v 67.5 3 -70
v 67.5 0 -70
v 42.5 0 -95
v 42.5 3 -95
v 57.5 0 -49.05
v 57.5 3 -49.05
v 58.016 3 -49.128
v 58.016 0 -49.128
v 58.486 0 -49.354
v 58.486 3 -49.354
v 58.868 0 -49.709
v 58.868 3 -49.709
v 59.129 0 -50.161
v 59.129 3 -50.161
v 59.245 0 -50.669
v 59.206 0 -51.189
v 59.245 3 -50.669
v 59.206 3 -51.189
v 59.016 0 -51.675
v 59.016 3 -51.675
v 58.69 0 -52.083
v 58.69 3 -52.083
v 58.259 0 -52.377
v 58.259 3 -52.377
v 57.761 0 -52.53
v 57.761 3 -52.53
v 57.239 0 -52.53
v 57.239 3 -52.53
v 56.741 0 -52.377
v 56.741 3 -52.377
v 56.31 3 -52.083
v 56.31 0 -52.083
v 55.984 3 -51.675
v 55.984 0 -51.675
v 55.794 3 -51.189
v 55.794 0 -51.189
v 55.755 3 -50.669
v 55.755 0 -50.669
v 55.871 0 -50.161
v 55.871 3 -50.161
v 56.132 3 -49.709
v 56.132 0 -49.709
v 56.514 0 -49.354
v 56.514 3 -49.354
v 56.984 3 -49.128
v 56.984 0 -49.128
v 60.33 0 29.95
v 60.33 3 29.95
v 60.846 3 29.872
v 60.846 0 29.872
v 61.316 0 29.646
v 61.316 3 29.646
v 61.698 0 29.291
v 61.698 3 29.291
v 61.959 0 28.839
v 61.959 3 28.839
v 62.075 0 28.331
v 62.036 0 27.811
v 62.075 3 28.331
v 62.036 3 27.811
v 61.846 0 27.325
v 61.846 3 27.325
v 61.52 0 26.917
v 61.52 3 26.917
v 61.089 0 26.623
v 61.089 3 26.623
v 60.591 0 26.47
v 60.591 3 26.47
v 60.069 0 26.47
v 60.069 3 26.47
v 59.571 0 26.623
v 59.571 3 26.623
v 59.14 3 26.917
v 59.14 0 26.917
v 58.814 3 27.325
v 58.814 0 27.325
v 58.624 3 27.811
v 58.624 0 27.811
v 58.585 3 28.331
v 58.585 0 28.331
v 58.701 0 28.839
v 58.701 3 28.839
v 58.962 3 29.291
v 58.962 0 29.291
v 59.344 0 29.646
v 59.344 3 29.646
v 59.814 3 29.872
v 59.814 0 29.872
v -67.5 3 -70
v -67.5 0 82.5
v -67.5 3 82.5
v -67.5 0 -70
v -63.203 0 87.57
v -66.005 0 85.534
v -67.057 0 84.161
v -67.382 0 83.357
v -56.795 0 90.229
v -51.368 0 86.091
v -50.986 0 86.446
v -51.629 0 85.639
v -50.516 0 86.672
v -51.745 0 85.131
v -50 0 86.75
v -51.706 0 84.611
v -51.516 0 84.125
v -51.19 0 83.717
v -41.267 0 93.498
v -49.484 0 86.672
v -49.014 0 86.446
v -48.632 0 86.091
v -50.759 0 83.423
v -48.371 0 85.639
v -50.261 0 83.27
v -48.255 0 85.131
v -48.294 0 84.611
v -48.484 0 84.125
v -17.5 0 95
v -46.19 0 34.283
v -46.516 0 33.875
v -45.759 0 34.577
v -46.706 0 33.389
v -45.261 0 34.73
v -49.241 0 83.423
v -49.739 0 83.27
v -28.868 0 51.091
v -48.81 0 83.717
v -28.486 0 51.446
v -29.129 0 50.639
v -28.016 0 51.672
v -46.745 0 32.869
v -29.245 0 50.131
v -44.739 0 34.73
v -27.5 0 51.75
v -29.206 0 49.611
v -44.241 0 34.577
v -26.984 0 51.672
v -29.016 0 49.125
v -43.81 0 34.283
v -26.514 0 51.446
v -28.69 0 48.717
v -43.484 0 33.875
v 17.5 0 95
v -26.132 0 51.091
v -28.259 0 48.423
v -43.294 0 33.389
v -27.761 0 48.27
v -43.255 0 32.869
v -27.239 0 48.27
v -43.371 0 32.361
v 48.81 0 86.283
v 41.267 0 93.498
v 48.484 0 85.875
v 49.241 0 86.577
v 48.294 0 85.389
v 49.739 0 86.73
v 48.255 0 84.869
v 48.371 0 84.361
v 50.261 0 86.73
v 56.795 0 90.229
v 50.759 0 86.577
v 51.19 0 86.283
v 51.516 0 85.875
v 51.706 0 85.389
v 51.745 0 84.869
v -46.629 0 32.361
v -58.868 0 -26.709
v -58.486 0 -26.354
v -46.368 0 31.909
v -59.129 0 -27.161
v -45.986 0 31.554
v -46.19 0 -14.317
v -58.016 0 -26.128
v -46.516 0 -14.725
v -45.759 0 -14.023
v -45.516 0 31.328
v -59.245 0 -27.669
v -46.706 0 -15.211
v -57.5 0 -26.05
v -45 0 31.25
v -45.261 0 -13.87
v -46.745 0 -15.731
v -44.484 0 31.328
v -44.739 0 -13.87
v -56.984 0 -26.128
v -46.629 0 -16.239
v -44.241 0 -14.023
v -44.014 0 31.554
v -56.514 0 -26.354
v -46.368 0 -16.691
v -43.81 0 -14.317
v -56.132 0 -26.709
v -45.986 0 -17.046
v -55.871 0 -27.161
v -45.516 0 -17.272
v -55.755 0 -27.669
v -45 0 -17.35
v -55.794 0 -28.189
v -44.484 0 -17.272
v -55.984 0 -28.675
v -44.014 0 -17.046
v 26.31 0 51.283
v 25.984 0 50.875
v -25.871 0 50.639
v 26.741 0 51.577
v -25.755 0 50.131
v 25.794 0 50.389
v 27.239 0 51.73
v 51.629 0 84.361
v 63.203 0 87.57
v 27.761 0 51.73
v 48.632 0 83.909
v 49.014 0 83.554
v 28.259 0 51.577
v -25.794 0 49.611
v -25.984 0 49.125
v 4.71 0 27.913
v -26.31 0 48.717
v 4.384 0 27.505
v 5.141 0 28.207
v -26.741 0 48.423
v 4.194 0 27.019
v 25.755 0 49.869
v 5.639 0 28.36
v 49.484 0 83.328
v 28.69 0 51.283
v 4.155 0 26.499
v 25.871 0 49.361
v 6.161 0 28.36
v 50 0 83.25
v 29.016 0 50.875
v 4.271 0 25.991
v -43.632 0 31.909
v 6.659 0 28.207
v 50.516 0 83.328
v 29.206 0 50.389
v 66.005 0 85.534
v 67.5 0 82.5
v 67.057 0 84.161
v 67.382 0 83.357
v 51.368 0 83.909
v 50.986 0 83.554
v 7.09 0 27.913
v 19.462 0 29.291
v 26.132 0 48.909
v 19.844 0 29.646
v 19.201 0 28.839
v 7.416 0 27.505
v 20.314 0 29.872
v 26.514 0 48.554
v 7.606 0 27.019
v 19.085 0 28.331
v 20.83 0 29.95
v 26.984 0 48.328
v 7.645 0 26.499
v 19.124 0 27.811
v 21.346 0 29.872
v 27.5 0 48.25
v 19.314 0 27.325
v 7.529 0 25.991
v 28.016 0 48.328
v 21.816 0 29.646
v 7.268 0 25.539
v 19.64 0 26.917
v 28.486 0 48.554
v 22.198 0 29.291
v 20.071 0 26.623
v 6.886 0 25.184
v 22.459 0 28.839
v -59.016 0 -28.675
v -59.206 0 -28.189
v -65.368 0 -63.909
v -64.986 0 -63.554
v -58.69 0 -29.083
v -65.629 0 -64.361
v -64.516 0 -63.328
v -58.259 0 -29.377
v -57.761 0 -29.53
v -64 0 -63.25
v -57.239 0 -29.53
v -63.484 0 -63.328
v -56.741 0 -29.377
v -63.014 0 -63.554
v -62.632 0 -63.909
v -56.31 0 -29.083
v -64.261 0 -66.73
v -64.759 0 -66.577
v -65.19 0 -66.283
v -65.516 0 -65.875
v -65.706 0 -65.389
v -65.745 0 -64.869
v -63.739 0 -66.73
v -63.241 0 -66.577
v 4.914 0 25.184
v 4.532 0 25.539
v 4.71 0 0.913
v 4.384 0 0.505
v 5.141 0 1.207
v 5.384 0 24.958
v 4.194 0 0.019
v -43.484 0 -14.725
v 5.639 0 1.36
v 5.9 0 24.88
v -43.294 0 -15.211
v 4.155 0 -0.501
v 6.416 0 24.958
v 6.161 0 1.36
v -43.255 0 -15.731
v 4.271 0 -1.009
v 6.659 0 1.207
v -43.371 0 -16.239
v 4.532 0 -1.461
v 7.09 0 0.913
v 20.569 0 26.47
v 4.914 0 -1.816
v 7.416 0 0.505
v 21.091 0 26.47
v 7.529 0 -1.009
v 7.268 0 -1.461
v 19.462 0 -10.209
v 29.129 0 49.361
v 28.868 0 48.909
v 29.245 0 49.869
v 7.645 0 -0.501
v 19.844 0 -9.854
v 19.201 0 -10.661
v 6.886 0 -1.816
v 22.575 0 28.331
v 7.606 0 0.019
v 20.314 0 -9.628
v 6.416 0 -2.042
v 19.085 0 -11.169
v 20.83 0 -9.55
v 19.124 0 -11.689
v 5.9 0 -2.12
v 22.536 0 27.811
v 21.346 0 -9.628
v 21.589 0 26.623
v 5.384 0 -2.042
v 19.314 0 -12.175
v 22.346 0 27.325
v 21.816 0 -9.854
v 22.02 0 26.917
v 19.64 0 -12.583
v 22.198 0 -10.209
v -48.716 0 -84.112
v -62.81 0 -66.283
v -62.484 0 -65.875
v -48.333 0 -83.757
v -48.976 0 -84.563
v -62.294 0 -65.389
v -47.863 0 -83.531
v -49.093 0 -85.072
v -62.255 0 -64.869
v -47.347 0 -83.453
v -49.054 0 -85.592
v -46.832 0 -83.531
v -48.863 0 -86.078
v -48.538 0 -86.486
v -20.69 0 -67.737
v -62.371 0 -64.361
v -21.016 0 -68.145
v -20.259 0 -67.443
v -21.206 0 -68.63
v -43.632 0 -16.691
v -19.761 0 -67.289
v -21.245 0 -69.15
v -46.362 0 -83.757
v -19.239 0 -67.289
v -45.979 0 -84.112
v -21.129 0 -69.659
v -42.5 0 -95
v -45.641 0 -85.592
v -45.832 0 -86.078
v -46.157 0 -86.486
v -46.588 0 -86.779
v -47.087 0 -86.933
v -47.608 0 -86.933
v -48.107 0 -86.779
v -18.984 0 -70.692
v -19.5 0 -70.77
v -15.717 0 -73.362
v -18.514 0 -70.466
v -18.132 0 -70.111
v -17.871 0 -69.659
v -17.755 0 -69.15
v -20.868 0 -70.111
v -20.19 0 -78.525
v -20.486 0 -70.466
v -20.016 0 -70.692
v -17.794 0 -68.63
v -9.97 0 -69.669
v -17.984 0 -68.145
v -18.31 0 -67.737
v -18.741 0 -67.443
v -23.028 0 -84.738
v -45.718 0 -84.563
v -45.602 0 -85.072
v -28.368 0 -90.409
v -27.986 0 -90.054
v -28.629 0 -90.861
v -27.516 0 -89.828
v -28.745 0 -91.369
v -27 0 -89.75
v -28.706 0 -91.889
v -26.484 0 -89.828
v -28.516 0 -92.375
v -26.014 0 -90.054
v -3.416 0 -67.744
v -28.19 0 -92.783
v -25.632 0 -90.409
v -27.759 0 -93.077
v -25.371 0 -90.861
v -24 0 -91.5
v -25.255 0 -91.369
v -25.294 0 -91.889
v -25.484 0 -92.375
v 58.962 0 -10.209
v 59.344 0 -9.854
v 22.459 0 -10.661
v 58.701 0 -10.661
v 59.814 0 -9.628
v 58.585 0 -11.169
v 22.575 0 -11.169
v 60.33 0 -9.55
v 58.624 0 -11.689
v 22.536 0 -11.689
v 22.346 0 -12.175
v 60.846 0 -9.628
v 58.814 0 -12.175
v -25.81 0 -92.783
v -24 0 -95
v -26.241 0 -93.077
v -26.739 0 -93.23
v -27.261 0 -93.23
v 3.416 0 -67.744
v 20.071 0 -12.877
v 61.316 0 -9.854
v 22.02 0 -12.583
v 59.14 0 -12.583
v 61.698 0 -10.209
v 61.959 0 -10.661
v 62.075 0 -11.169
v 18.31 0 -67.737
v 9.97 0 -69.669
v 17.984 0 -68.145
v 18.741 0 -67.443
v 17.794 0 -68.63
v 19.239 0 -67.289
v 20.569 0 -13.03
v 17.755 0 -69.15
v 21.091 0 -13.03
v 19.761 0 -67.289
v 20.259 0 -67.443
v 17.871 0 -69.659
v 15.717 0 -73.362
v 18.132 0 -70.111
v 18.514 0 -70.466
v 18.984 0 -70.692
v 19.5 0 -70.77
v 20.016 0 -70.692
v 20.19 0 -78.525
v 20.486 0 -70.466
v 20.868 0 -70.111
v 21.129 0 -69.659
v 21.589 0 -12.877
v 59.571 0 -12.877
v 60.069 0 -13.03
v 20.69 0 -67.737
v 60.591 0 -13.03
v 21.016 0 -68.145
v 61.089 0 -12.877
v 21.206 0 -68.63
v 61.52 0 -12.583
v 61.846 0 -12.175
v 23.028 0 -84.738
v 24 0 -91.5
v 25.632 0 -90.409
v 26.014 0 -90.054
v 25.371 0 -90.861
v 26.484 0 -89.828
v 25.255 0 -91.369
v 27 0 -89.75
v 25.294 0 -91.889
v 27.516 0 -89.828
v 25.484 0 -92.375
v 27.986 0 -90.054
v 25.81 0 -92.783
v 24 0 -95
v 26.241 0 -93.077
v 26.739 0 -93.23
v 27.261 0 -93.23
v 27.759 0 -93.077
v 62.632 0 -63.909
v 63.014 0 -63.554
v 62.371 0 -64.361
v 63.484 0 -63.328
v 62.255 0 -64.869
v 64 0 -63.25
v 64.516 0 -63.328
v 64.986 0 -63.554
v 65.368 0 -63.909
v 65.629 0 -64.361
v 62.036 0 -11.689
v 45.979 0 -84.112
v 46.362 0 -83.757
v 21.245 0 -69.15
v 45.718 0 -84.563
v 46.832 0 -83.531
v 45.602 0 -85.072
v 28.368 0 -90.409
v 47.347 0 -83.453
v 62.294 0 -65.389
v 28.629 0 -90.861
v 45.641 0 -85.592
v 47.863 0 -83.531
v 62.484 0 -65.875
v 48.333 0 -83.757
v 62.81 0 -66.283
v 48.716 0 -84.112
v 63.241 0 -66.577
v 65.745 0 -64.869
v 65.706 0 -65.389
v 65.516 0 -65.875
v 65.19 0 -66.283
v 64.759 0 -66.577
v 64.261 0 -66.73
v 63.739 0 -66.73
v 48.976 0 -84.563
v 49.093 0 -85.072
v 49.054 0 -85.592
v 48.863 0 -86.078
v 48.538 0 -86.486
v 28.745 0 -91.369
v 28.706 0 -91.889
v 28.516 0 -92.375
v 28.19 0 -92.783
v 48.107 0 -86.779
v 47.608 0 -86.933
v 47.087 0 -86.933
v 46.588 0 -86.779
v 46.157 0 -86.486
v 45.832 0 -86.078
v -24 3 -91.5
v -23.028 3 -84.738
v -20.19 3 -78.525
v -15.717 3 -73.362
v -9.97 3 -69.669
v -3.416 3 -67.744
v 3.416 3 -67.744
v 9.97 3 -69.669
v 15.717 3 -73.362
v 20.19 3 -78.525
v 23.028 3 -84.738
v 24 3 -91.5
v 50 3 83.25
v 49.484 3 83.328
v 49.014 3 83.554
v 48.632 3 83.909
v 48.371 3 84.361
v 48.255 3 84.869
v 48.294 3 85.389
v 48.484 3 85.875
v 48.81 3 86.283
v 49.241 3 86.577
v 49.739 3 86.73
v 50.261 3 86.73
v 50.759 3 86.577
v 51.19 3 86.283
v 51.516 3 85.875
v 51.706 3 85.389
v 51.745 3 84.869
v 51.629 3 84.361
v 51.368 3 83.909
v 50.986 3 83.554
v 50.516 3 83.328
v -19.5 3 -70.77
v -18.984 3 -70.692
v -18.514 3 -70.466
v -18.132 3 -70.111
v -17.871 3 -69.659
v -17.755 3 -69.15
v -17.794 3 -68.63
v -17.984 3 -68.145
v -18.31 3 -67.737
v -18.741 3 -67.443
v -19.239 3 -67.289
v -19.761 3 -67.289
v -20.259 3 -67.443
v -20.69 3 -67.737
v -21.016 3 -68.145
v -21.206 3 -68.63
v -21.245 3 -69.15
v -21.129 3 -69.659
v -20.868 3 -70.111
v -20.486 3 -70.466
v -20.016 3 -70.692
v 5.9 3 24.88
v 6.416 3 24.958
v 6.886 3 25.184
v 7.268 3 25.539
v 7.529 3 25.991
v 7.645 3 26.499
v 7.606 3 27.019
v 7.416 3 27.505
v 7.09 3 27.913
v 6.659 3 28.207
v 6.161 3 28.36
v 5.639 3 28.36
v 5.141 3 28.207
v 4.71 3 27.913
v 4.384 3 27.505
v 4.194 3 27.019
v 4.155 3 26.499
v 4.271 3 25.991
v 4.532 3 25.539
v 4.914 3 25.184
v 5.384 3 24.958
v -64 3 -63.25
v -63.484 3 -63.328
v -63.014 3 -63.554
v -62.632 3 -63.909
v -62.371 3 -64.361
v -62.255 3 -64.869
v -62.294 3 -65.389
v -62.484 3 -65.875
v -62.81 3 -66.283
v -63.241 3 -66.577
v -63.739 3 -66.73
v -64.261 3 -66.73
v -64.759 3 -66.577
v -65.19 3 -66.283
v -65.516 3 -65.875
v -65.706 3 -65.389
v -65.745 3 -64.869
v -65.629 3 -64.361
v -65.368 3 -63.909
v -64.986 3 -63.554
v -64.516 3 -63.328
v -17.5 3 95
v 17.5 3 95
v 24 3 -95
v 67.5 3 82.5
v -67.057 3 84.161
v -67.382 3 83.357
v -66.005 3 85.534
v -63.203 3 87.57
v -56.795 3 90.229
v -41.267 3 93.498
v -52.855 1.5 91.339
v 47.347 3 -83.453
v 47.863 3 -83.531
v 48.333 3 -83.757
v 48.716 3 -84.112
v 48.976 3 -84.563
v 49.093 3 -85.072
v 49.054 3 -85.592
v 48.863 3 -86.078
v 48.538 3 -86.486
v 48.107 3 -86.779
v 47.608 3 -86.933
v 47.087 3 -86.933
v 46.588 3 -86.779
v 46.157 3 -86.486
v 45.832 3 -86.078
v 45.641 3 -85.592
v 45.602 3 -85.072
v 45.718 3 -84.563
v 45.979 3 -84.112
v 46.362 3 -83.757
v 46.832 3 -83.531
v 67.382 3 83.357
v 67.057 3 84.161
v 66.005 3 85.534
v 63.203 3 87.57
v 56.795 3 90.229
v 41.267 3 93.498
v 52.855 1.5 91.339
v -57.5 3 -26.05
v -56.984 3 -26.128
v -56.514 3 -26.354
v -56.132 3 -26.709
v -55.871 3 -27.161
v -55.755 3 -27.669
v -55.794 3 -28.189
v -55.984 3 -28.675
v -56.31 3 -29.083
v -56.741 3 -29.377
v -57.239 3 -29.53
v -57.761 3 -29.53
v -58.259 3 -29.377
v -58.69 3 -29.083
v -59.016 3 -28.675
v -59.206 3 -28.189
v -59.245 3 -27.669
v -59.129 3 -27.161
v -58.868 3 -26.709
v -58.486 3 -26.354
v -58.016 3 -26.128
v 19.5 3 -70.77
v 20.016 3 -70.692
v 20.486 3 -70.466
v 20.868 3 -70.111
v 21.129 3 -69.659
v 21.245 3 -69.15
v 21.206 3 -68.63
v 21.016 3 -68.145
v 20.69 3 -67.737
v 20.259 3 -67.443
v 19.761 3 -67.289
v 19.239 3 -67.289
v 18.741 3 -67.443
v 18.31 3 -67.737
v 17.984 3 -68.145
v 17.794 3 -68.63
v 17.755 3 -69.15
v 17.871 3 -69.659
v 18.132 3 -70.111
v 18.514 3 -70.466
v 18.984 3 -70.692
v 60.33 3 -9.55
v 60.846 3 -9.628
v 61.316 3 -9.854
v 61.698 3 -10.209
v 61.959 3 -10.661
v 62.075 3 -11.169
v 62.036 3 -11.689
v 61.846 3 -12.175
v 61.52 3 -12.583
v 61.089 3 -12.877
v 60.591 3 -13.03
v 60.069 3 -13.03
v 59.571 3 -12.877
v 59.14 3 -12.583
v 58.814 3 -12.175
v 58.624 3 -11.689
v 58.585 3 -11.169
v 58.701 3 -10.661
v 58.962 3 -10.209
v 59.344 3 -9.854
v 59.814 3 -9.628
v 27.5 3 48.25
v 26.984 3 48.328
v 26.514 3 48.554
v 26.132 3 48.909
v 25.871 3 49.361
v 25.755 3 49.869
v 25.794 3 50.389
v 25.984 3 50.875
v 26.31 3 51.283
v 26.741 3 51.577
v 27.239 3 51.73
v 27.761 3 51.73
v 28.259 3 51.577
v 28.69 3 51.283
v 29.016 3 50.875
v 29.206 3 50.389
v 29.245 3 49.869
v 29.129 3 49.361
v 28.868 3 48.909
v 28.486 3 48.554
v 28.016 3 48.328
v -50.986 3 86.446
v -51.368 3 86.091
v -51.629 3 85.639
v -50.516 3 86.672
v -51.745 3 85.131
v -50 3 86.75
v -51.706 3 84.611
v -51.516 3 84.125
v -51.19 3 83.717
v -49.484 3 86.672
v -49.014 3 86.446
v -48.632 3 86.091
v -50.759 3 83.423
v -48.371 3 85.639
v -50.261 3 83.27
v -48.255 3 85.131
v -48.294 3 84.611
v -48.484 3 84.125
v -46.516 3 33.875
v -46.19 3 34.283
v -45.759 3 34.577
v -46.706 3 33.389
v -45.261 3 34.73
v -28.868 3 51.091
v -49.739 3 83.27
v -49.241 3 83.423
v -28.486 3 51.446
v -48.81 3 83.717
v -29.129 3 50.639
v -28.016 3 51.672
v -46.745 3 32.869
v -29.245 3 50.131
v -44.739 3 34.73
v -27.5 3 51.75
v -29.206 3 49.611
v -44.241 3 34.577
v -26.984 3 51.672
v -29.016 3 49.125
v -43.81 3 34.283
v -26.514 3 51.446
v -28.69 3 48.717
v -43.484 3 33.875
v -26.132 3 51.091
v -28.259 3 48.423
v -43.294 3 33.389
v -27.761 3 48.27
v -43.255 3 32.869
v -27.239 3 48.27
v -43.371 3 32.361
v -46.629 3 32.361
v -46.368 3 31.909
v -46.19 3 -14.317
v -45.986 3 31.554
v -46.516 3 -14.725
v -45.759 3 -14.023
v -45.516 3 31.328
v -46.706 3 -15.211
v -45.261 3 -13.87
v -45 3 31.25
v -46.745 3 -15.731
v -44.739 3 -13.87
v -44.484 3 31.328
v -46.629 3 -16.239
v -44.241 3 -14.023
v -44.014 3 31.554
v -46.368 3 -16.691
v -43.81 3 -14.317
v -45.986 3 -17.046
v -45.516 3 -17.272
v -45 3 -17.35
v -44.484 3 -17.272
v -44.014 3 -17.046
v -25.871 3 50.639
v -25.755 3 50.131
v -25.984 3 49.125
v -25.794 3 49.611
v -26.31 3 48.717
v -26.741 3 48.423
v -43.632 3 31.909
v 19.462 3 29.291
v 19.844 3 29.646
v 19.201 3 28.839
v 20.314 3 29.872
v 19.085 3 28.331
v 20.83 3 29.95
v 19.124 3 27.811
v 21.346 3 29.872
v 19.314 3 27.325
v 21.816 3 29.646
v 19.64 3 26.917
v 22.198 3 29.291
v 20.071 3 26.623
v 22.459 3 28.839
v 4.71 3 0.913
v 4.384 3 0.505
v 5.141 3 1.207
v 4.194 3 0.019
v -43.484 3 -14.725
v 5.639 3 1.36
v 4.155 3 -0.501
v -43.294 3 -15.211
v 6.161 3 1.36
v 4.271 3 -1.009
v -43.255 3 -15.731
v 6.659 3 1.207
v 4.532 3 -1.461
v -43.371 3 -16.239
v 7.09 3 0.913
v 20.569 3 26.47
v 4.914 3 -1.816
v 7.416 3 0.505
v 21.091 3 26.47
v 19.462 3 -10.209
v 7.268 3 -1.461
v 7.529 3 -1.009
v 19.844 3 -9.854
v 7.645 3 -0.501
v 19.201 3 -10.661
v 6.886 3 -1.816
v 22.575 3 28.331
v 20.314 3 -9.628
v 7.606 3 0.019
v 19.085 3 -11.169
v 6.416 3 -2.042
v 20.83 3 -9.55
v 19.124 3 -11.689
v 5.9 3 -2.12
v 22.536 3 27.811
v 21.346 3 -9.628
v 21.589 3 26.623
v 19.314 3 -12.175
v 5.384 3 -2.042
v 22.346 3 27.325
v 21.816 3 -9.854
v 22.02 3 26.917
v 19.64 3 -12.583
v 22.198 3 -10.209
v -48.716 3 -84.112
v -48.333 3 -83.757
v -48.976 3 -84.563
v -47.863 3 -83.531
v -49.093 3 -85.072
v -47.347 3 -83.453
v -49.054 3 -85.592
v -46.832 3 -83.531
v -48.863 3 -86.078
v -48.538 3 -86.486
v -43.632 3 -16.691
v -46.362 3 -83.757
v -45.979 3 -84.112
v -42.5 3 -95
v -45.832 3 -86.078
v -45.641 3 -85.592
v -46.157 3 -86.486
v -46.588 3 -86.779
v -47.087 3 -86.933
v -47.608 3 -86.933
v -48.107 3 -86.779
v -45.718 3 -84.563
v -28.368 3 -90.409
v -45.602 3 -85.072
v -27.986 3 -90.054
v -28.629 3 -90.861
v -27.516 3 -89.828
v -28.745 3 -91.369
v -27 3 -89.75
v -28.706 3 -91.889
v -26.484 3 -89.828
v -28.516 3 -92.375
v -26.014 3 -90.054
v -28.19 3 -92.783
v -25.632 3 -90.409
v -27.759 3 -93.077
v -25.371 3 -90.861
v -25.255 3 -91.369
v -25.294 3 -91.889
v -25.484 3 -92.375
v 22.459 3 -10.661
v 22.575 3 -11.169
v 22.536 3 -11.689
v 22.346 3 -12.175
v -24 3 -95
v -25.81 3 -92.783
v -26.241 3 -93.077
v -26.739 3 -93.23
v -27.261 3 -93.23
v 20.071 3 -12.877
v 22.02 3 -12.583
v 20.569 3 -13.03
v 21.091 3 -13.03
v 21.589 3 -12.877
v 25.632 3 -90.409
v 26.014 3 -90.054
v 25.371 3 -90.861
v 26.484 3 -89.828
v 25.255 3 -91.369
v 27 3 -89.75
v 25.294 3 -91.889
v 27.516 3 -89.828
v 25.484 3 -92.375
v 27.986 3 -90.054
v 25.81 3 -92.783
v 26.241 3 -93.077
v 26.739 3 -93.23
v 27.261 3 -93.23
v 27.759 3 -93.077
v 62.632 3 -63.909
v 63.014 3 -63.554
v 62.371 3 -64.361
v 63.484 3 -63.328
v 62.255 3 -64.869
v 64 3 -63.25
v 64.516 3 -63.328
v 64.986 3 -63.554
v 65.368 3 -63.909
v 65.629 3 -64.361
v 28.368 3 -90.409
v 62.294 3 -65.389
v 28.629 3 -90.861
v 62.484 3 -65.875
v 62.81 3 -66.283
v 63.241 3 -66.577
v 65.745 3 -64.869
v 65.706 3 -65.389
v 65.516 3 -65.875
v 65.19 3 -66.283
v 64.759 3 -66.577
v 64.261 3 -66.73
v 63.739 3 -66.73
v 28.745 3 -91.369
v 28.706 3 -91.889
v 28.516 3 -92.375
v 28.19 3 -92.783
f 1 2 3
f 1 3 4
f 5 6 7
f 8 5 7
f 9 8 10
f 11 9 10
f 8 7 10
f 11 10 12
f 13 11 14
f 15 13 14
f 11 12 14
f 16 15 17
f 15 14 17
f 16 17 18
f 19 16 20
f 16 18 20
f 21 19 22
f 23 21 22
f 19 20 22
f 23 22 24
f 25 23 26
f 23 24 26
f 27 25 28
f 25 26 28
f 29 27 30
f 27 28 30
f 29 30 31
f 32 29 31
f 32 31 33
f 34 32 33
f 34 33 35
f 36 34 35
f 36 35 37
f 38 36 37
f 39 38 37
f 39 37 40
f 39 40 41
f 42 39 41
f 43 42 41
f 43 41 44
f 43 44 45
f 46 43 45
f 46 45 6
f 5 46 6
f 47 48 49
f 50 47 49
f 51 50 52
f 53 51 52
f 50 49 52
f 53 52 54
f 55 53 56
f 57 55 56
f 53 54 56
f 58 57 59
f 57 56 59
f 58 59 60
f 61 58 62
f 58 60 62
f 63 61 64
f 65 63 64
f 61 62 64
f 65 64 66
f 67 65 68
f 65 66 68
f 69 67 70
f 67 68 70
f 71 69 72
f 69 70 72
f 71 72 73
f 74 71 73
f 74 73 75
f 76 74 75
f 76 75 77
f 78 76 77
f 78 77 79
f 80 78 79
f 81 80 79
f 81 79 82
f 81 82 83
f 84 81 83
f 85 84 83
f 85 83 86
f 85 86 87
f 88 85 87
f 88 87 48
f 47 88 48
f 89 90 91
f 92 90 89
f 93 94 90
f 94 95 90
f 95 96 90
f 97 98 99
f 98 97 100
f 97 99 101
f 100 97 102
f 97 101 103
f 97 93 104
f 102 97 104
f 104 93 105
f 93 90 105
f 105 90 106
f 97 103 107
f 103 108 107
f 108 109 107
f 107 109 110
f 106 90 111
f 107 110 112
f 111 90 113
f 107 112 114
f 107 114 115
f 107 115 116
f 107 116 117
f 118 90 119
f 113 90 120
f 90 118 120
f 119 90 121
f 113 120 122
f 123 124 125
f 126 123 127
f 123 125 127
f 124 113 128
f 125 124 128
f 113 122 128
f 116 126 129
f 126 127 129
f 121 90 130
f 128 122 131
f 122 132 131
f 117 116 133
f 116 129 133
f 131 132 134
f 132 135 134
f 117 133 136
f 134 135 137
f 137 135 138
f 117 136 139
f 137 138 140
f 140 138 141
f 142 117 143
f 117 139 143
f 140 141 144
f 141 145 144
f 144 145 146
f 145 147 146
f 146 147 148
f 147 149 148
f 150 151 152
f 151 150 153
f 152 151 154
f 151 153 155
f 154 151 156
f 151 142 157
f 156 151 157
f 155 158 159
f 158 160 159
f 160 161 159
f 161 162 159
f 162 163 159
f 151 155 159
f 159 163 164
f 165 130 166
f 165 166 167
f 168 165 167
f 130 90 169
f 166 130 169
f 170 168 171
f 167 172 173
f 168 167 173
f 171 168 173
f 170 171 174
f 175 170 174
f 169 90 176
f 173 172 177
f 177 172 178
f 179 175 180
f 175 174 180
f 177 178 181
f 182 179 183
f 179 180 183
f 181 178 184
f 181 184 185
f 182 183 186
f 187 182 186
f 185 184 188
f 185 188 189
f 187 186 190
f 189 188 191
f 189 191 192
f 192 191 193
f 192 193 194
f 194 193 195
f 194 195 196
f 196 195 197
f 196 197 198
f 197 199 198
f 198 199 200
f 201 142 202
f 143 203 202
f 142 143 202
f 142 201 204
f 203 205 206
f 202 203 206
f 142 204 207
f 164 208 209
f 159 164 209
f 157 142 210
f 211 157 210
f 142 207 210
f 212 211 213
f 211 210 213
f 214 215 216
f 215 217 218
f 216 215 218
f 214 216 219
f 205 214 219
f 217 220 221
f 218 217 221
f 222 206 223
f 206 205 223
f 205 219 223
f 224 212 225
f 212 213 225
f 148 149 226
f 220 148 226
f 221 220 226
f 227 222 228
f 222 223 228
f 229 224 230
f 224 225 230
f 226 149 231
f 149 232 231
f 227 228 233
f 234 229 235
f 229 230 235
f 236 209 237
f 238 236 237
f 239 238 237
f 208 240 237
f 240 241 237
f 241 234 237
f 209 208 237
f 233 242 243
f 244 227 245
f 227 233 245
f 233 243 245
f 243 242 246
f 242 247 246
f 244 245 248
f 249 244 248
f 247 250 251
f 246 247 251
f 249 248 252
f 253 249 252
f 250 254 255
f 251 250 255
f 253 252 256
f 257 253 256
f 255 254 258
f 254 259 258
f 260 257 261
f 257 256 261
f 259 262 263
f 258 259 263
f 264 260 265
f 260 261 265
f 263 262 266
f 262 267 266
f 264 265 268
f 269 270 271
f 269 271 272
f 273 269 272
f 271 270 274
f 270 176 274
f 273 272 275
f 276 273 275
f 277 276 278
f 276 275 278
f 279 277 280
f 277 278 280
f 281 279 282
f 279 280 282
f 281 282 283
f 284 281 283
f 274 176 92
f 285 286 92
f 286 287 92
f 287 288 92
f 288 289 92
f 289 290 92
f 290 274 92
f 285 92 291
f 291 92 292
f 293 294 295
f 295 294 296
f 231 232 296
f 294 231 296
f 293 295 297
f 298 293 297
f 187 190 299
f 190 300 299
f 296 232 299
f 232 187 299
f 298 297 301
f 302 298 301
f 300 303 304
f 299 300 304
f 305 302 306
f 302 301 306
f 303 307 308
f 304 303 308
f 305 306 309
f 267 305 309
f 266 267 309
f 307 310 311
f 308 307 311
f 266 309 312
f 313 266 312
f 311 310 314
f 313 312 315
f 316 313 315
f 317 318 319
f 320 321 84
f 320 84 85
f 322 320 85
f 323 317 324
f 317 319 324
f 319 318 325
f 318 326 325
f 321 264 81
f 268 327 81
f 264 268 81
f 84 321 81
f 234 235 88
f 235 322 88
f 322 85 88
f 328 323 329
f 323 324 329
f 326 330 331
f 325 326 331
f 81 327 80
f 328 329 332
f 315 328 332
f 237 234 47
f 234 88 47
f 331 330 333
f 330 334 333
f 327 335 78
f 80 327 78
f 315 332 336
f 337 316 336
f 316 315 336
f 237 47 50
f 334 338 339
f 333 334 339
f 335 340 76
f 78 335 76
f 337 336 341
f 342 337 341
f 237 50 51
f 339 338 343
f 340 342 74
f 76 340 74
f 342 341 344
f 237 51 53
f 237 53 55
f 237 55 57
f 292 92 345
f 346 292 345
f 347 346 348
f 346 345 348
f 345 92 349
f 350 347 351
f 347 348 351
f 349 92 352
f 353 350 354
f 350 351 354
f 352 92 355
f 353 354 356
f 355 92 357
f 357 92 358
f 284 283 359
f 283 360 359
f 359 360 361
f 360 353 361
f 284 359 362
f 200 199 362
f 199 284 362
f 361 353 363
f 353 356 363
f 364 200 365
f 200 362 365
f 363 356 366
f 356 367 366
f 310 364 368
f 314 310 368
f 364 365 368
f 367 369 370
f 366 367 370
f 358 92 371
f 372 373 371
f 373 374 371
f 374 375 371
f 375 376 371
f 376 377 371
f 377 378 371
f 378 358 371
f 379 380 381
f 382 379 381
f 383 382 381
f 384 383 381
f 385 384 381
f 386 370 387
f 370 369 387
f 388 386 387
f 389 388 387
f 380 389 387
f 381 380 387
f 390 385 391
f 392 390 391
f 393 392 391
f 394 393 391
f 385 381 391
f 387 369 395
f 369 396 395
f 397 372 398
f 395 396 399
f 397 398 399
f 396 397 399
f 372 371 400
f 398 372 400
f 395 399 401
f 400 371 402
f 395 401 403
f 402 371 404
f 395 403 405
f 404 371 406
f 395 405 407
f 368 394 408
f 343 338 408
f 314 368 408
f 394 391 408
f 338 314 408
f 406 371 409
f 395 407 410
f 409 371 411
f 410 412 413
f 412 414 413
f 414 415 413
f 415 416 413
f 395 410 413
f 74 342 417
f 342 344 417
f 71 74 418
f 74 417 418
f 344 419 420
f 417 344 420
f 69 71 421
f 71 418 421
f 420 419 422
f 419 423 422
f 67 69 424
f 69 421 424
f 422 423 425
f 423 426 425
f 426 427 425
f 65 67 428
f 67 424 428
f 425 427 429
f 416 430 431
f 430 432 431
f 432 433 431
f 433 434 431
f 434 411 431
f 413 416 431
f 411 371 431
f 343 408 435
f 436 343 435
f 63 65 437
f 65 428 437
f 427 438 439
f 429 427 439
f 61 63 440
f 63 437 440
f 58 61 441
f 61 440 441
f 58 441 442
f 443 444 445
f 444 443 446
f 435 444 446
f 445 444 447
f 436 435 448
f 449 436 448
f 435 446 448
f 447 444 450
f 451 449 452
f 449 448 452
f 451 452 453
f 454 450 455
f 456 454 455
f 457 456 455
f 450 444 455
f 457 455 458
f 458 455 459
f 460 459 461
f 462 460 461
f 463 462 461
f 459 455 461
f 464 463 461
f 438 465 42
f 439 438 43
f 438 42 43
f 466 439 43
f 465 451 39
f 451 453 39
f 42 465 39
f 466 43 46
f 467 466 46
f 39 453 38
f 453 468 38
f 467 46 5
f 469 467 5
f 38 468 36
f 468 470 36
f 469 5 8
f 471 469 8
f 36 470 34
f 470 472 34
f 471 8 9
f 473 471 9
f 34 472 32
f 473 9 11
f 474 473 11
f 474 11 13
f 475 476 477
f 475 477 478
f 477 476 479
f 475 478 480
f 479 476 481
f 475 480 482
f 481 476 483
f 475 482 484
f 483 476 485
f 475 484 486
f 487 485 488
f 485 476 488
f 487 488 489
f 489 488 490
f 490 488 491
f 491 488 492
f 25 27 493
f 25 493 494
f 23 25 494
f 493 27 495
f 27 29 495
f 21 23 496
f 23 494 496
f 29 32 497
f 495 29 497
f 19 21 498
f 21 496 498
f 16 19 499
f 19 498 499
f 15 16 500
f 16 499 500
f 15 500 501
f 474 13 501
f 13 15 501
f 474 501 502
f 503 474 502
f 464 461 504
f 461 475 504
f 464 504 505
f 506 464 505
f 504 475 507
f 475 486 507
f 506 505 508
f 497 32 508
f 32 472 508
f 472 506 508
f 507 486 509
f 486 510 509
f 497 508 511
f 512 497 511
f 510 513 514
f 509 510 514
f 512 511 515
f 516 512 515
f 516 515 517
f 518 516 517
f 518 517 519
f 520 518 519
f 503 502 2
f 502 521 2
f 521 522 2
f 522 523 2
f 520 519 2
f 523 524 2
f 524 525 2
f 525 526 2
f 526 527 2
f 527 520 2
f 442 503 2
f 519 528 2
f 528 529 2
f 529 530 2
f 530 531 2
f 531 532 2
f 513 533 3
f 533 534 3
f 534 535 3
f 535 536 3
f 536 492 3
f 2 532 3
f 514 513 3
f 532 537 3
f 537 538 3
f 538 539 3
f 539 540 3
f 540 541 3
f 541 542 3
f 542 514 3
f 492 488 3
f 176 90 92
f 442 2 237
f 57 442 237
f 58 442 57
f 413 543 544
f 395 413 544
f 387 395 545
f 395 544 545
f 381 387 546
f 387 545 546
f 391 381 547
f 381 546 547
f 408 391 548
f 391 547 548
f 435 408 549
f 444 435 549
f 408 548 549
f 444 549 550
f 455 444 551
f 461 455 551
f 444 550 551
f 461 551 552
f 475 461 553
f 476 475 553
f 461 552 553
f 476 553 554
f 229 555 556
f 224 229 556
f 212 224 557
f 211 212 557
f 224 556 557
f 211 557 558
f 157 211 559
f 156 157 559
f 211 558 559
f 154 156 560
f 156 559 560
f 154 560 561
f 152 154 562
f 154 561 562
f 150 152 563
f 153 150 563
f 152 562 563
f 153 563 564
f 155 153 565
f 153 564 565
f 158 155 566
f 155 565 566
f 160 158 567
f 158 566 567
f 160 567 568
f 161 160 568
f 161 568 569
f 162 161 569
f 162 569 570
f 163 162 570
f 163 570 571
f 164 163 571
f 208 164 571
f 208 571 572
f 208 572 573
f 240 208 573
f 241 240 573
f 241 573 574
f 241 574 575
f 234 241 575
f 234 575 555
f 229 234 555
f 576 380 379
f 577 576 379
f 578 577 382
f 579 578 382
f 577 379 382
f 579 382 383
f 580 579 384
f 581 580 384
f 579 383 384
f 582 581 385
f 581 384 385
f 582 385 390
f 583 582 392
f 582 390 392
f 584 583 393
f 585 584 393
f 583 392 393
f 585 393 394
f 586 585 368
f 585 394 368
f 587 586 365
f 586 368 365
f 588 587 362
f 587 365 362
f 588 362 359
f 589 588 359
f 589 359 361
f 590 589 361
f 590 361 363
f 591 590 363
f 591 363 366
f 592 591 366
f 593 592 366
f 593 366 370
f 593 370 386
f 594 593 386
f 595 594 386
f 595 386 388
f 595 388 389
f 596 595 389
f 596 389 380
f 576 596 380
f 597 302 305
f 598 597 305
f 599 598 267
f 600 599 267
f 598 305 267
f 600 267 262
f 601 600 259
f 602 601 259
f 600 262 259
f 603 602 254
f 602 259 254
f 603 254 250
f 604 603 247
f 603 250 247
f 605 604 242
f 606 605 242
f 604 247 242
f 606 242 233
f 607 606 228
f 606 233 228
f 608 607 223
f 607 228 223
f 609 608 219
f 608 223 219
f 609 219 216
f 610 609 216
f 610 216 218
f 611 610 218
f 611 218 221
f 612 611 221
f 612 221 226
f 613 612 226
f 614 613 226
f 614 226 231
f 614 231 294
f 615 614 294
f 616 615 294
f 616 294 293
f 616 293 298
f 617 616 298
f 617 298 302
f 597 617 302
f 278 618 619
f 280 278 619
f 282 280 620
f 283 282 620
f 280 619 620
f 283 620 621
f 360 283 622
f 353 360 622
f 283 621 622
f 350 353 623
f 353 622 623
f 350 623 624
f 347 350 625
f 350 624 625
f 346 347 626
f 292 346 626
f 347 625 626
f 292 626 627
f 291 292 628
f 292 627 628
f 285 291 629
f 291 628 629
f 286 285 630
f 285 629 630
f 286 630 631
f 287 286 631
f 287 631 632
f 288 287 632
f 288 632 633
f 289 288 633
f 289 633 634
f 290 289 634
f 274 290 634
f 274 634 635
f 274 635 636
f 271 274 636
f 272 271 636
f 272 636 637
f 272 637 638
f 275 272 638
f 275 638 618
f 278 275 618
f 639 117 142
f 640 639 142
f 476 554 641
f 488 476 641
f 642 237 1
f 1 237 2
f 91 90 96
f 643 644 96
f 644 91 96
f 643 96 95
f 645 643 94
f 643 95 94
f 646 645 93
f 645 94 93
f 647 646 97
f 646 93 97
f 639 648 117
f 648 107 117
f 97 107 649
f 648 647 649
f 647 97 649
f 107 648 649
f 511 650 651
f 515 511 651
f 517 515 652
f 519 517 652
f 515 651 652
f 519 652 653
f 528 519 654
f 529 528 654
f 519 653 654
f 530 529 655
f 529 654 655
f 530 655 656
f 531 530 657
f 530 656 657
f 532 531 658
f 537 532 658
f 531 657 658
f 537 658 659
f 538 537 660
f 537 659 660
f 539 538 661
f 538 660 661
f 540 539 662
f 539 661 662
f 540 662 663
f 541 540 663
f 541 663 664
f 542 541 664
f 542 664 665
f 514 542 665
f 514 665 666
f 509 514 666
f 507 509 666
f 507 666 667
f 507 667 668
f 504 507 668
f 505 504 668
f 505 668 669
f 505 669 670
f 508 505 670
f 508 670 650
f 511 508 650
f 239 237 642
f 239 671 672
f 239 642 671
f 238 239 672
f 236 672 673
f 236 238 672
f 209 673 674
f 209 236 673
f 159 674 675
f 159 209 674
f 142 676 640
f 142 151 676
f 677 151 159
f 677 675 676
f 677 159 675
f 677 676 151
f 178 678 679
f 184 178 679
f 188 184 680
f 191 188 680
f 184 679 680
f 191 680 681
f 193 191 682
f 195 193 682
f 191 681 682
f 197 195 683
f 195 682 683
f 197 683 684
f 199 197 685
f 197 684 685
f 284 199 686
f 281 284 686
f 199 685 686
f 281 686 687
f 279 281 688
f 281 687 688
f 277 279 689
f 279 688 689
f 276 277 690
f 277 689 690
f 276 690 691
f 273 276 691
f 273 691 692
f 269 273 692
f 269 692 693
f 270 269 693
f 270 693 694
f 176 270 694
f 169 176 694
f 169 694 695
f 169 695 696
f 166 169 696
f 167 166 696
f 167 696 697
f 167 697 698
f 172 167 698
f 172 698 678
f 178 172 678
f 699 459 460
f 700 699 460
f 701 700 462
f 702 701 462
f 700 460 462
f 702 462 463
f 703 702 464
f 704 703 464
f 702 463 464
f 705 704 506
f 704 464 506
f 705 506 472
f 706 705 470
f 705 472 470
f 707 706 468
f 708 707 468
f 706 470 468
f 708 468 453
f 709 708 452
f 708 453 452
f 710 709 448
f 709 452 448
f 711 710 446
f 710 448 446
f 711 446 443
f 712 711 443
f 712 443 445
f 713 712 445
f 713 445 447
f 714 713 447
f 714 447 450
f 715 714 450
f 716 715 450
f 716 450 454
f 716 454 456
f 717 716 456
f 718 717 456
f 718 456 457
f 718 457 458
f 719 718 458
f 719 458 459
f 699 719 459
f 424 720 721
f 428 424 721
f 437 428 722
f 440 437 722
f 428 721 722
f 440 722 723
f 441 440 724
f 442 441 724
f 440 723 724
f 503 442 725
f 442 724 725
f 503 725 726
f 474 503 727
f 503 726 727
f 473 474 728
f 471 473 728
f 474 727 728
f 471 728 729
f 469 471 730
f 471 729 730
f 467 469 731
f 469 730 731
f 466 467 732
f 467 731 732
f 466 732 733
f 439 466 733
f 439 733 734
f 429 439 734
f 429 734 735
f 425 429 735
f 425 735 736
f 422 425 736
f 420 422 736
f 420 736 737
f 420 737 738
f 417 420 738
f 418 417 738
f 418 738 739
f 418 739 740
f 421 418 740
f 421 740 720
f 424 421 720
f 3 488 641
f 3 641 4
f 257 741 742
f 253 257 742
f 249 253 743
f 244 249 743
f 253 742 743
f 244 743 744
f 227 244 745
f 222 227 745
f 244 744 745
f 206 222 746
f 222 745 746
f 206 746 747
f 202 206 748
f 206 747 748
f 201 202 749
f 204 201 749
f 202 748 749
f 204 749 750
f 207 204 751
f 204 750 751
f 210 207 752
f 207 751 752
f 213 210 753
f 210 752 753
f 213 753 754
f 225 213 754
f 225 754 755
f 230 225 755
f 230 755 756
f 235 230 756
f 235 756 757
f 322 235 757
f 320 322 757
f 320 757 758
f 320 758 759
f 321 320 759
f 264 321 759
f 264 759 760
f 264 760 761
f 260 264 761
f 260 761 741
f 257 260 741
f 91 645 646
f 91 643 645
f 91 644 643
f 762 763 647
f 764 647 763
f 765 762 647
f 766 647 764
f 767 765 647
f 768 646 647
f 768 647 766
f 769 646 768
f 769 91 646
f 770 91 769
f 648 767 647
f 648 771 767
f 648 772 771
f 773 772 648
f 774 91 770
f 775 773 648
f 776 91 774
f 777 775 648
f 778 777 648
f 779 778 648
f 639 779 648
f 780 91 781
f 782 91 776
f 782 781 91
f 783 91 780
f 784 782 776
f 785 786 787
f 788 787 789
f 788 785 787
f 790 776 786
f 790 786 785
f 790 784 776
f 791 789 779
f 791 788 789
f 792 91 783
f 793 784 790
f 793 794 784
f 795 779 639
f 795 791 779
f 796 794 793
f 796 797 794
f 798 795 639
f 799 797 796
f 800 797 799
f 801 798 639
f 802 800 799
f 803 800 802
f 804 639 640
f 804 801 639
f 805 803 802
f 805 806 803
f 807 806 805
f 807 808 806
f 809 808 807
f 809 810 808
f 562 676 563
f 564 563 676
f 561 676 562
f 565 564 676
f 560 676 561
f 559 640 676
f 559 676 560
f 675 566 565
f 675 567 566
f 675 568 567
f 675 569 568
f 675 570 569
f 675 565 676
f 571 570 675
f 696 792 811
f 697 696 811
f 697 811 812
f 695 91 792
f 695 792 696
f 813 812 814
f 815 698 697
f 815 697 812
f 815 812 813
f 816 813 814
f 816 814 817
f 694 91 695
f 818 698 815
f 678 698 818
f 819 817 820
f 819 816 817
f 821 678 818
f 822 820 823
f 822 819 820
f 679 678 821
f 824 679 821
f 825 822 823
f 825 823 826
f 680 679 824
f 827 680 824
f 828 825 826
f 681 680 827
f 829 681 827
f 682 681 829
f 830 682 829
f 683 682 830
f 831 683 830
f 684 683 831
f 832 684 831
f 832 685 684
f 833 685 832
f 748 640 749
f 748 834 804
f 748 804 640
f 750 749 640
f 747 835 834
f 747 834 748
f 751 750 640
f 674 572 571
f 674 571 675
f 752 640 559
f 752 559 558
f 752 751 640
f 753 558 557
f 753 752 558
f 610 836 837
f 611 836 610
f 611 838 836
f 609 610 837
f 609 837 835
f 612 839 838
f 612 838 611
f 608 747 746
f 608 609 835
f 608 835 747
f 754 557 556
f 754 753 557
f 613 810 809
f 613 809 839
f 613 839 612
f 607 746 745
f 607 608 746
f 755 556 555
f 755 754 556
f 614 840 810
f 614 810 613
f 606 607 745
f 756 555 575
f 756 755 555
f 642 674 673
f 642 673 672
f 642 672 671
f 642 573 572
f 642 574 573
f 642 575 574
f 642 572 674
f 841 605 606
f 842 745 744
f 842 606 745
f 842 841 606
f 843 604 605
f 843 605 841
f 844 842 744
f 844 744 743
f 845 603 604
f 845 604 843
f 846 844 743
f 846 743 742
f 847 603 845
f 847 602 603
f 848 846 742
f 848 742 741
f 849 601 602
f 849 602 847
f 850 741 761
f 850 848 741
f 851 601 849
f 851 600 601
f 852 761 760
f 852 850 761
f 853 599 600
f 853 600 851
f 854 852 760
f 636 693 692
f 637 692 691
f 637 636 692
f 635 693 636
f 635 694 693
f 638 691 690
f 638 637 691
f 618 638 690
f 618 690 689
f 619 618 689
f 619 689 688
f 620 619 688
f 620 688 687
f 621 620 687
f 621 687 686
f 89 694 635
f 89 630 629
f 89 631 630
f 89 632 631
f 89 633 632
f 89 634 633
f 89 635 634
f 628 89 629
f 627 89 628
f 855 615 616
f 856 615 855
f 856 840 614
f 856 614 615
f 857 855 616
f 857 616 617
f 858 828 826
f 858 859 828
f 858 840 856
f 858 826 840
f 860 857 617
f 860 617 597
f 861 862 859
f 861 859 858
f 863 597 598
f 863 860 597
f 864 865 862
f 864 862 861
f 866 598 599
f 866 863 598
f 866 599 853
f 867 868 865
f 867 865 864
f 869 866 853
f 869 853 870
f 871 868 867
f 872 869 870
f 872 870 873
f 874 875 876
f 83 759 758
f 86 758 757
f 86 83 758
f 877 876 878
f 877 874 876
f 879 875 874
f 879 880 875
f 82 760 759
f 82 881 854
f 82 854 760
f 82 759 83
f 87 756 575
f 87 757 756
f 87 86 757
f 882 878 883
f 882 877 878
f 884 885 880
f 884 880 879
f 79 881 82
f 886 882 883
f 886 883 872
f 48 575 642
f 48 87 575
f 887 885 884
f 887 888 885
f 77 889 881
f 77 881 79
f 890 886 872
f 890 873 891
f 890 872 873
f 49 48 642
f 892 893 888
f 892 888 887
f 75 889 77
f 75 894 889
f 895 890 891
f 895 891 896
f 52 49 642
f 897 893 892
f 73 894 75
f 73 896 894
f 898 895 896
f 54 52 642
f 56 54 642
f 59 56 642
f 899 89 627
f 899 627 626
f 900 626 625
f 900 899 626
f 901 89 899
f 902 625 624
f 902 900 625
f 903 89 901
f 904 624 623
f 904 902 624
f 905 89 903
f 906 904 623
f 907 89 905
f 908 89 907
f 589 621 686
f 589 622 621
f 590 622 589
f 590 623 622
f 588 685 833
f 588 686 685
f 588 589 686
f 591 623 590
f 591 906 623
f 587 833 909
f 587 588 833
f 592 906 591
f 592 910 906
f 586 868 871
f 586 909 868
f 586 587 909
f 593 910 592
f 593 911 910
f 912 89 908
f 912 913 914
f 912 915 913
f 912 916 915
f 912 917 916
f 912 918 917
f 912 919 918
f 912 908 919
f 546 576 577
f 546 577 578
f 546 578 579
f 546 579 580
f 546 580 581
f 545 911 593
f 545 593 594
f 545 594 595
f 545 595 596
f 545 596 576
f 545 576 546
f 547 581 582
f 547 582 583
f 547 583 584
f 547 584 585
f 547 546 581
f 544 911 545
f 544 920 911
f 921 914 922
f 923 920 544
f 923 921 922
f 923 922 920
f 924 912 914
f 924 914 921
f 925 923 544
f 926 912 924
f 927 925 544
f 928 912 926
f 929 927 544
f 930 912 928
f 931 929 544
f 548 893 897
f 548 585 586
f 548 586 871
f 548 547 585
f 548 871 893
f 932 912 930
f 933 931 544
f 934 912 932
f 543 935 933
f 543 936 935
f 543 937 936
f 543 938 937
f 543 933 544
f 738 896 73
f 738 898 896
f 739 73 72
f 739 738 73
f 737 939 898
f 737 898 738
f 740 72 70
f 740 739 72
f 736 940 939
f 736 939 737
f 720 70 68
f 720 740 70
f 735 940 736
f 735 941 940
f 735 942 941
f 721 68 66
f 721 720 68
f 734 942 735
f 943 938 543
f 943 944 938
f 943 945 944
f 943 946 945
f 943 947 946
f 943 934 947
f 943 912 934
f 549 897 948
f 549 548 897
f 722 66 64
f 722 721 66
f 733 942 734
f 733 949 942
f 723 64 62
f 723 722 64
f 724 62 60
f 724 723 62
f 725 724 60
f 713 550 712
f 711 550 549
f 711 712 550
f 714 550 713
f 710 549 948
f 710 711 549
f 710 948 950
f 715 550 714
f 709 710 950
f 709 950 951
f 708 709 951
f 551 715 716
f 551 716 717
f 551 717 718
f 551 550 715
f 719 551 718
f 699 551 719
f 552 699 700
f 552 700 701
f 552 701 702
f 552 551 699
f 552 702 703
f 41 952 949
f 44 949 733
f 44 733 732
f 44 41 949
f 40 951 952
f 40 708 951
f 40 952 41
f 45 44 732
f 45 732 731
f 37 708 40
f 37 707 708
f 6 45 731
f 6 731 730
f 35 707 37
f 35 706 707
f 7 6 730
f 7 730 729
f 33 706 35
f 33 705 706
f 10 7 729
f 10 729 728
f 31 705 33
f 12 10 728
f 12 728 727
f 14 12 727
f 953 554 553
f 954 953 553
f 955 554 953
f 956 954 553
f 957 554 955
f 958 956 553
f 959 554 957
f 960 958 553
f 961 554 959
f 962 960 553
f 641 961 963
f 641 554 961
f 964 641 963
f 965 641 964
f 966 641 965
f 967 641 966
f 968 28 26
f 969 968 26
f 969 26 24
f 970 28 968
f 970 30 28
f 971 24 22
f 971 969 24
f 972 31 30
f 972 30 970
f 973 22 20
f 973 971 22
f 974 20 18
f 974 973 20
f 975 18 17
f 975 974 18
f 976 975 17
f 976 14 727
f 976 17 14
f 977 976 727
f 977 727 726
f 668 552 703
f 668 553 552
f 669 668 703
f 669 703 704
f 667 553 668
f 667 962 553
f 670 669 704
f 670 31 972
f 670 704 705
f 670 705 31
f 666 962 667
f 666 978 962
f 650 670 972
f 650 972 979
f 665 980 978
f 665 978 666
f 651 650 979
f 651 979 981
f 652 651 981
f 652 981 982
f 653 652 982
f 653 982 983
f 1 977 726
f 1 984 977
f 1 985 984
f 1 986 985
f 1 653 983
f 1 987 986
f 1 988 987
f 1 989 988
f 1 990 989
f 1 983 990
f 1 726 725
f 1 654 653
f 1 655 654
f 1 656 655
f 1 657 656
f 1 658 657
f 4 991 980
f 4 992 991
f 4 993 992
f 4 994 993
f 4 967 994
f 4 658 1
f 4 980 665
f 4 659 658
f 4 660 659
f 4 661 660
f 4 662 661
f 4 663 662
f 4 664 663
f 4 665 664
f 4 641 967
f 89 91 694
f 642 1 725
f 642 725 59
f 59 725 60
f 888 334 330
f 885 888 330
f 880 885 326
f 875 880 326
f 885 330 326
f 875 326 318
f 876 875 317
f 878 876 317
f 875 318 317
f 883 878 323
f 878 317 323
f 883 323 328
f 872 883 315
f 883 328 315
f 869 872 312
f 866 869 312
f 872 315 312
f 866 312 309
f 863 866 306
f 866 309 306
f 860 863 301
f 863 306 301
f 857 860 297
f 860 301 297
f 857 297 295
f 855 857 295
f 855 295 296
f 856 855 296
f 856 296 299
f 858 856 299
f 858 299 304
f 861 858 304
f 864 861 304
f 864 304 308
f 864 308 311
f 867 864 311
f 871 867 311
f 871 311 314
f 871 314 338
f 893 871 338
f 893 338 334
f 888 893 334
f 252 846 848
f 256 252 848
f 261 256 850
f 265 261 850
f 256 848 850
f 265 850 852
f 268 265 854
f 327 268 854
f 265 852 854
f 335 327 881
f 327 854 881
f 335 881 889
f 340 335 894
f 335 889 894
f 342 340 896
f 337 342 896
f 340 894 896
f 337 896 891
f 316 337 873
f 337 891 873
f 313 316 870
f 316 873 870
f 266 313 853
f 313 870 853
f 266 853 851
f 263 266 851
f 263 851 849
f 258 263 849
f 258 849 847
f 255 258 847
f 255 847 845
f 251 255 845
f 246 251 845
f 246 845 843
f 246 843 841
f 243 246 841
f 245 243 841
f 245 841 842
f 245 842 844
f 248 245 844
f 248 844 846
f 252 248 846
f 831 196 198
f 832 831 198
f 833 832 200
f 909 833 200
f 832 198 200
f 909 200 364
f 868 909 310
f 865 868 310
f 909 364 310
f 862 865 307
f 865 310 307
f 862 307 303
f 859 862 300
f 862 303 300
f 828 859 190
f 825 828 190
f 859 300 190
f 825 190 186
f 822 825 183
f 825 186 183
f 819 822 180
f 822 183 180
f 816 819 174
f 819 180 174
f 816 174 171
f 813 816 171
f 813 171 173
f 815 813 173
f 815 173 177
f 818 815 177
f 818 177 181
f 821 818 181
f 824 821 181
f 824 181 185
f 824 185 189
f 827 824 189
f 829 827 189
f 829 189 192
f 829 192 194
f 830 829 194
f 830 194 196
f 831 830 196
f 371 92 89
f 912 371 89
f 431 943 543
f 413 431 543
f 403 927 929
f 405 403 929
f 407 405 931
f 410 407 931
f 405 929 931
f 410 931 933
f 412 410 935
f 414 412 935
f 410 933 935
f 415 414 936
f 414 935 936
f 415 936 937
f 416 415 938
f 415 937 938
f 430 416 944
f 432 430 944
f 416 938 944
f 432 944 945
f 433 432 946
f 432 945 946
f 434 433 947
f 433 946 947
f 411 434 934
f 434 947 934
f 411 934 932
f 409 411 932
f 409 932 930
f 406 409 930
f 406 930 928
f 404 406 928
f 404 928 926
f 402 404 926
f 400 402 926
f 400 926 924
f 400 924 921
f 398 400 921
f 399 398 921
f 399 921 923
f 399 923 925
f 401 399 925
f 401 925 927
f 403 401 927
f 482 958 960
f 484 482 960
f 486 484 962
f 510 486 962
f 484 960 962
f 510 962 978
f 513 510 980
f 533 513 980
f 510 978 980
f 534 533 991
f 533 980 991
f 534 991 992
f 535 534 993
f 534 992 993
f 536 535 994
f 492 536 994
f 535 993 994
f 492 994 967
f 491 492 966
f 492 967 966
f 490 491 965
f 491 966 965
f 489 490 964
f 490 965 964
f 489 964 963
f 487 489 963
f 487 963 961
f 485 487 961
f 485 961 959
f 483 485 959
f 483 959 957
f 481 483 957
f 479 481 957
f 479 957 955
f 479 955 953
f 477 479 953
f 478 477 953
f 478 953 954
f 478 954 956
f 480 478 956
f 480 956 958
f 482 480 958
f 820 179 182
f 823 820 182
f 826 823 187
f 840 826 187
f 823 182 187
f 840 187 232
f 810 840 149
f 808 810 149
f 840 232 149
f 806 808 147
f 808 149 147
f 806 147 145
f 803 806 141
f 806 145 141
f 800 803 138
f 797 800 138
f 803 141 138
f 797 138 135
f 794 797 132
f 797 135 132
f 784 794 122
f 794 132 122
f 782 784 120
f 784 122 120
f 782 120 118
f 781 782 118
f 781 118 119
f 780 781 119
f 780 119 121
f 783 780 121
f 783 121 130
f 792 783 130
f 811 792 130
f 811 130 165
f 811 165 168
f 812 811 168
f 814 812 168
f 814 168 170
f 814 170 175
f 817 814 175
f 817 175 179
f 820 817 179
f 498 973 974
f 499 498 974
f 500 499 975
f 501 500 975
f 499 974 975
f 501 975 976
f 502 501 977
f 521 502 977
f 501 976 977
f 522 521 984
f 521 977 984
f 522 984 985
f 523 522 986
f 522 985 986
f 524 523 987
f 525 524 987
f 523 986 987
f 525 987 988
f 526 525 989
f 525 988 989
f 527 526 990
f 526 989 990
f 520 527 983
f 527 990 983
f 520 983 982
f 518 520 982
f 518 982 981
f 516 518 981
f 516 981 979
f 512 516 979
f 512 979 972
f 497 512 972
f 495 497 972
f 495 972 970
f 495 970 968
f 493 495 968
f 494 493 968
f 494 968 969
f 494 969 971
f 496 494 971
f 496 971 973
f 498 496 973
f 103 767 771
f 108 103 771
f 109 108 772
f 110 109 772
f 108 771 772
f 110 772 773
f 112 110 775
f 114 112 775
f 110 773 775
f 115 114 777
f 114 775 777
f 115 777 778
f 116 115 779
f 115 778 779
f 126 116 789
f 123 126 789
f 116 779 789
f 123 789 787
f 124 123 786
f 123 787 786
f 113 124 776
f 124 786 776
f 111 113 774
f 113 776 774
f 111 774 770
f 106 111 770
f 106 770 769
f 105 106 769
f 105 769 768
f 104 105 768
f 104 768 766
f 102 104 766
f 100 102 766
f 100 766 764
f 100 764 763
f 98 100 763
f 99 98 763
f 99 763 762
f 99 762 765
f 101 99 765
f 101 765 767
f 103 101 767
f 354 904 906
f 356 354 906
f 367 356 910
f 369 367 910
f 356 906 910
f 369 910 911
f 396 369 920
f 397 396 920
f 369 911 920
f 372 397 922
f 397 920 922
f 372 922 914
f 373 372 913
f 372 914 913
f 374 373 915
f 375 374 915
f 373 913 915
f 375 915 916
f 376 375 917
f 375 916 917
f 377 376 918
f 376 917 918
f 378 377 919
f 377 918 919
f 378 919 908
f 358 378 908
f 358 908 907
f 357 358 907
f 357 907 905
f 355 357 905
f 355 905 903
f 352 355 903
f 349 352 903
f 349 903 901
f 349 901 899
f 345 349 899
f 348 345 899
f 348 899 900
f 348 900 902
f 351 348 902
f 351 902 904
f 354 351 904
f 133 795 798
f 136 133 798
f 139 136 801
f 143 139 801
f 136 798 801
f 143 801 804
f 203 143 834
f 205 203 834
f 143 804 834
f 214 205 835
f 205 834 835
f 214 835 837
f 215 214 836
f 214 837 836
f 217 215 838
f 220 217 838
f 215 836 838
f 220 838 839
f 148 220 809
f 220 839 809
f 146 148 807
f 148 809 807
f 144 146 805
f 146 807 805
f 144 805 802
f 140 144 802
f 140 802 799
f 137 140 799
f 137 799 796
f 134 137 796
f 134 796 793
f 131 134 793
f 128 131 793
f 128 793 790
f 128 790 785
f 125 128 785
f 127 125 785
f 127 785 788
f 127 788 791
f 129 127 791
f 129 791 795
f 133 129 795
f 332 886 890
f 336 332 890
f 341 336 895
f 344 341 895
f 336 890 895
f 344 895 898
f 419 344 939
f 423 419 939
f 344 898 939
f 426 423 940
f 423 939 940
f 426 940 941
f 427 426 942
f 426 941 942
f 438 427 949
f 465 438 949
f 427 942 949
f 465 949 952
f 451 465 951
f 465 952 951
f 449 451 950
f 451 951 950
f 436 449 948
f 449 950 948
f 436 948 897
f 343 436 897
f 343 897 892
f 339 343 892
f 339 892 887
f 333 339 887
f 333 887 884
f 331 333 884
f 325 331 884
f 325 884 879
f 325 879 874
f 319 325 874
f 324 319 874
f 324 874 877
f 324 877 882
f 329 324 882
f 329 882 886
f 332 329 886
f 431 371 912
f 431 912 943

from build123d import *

# Parameters (mm, degrees)
SKETCH2_W           = 135
SKETCH2_H           = 190
BOSS_EXTRUDE2_DEPTH = 3
SKETCH3_R           = 1.75
CUT_EXTRUDE1_DEPTH  = 117.577227622
FILLET1_SIZE        = 12.5
FILLET1_SIZE_2      = 50
FILLET2_SIZE        = 12.5
FILLET2_SIZE_2      = 50
CHAMFER2_SIZE       = 25
CHAMFER3_SIZE       = 25
CUT_EXTRUDE5_DEPTH  = 117.577227764
SKETCH8_R           = 1.75
CUT_EXTRUDE6_DEPTH  = 117.577227764
SKETCH11_R          = 1.75
CUT_EXTRUDE8_DEPTH  = 117.577227764
SKETCH12_R          = 1.75
CUT_EXTRUDE9_DEPTH  = 117.577227764
SKETCH18_R          = 1.75
CUT_EXTRUDE10_DEPTH = 117.577227764
SKETCH19_R          = 1.75
CUT_EXTRUDE11_DEPTH = 117.577227764
SKETCH20_R          = 1.75
CUT_EXTRUDE12_DEPTH = 10


with BuildPart() as part:
    # Sketch2 → Boss-Extrude2 (new body)
    with BuildSketch(Plane(origin=(0, 0, 0), x_dir=(1, 0, 0), z_dir=(0, 1, 0))):
        Rectangle(SKETCH2_W, SKETCH2_H)
    extrude(amount=BOSS_EXTRUDE2_DEPTH)

    # Sketch3 → Cut-Extrude1 (cut, through all)
    with BuildSketch(Plane(origin=(0, 3, 0), x_dir=(1, 0, 0), z_dir=(0, 1, 0))):
        with Locations(Location((-27.5, -50, 0), (0, 0, 270))):
            Circle(SKETCH3_R)
        with Locations(Location((27.5, -50, 0), (0, 0, 90))):
            Circle(SKETCH3_R)
        with Locations(Location((-50, -85, 0), (0, 0, 270))):
            Circle(SKETCH3_R)
        with Locations(Location((50, -85, 0), (0, 0, 90))):
            Circle(SKETCH3_R)
    extrude(amount=-CUT_EXTRUDE1_DEPTH, mode=Mode.SUBTRACT)

    # Fillet1
    # an asymmetric fillet: 50, 12.5 mm, written as the material it takes off along each edge
    with BuildSketch(Plane(origin=(-67.5, -125, 95), x_dir=(0, 0, -1), z_dir=(0, 1, 0))) as fillet1_piece_1:
        with BuildLine():
            Bezier((FILLET1_SIZE, 0), (0, 0), (0, -FILLET1_SIZE_2), weights=[1, 0.707106781, 1])
            Line((0, -FILLET1_SIZE_2), (0, 0))
            Line((0, 0), (FILLET1_SIZE, 0))
        make_face()
    extrude(amount=253, mode=Mode.SUBTRACT)

    # Fillet2
    # an asymmetric fillet: 50, 12.5 mm, written as the material it takes off along each edge
    with BuildSketch(Plane(origin=(67.5, -125, 95), x_dir=(0, 0, -1), z_dir=(0, 1, 0))) as fillet2_piece_1:
        with BuildLine():
            Bezier((FILLET2_SIZE, 0), (0, 0), (0, FILLET2_SIZE_2), weights=[1, 0.707106781, 1])
            Line((0, FILLET2_SIZE_2), (0, 0))
            Line((0, 0), (FILLET2_SIZE, 0))
        make_face()
    extrude(amount=253, mode=Mode.SUBTRACT)

    # Chamfer2
    chamfer2_edges = [part.edges().sort_by_distance(p)[0] for p in [
        (67.5, 1.5, -95),
    ]]
    chamfer(chamfer2_edges, length=CHAMFER2_SIZE)

    # Chamfer3
    chamfer3_edges = [part.edges().sort_by_distance(p)[0] for p in [
        (-67.5, 1.5, -95),
    ]]
    chamfer(chamfer3_edges, length=CHAMFER3_SIZE)

    # Sketch7 → Cut-Extrude5 (cut, through all)
    with BuildSketch(Plane(origin=(0, 3, 0), x_dir=(1, 0, 0), z_dir=(0, 1, 0))):
        with BuildLine():
            Line((24, 91.5), (24, 95))
            Line((24, 95), (-24, 95))
            Line((-24, 95), (-24, 91.5))
            ThreePointArc((-24, 91.5), (0, 67.5), (24, 91.5))
        make_face()
    extrude(amount=-CUT_EXTRUDE5_DEPTH, mode=Mode.SUBTRACT)

    # Sketch8 → Cut-Extrude6 (cut, through all)
    with BuildSketch(Plane(origin=(0, 3, 0), x_dir=(1, 0, 0), z_dir=(0, 1, 0))):
        with Locations(Location((-27, 91.5, 0), (0, 0, 270))):
            Circle(SKETCH8_R)
        with Locations(Location((27, 91.5, 0), (0, 0, 270))):
            Circle(SKETCH8_R)
    extrude(amount=-CUT_EXTRUDE6_DEPTH, mode=Mode.SUBTRACT)

    # Sketch11 → Cut-Extrude8 (cut, through all)
    with BuildSketch(Plane(origin=(0, 3, 0), x_dir=(1, 0, 0), z_dir=(0, 1, 0))):
        with Locations(Location((47.347456736, 85.202795796, 0), (0, 0, 270))):
            Circle(SKETCH11_R)
        with Locations(Location((64, 65, 0), (0, 0, 270))):
            Circle(SKETCH11_R)
        with Locations(Location((-64, 65, 0), (0, 0, 270))):
            Circle(SKETCH11_R)
        with Locations(Location((-47.347456736, 85.202795796, 0), (0, 0, 270))):
            Circle(SKETCH11_R)
    extrude(amount=-CUT_EXTRUDE8_DEPTH, mode=Mode.SUBTRACT)

    # Sketch12 → Cut-Extrude9 (cut, through all)
    with BuildSketch(Plane(origin=(0, 0, 0), x_dir=(-1, 0, 0), z_dir=(0, -1, 0))):
        with Locations(Location((45, -33, 0), (0, 0, 90))):
            Circle(SKETCH12_R)
        with Locations(Location((-5.9, -26.63, 0), (0, 0, 90))):
            Circle(SKETCH12_R)
        with Locations(Location((45, 15.6, 0), (0, 0, 90))):
            Circle(SKETCH12_R)
        with Locations(Location((-5.9, 0.37, 0), (0, 0, 90))):
            Circle(SKETCH12_R)
    extrude(amount=-CUT_EXTRUDE9_DEPTH, mode=Mode.SUBTRACT)

    # Sketch18 → Cut-Extrude10 (cut, through all)
    with BuildSketch(Plane(origin=(0, 3, 0), x_dir=(1, 0, 0), z_dir=(0, 1, 0))):
        with Locations(Location((20.83, -28.2, 0), (0, 0, 270))):
            Circle(SKETCH18_R)
        with Locations(Location((20.83, 11.3, 0), (0, 0, 270))):
            Circle(SKETCH18_R)
        with Locations(Location((60.33, 11.3, 0), (0, 0, 270))):
            Circle(SKETCH18_R)
        with Locations(Location((60.33, -28.2, 0), (0, 0, 270))):
            Circle(SKETCH18_R)
    extrude(amount=-CUT_EXTRUDE10_DEPTH, mode=Mode.SUBTRACT)

    # Sketch19 → Cut-Extrude11 (cut, through all)
    with BuildSketch(Plane(origin=(0, 3, 0), x_dir=(1, 0, 0), z_dir=(0, 1, 0))):
        with Locations(Location((57.5, 50.8, 0), (0, 0, 270))):
            Circle(SKETCH19_R)
        with Locations(Location((-57.5, 27.8, 0), (0, 0, 270))):
            Circle(SKETCH19_R)
    extrude(amount=-CUT_EXTRUDE11_DEPTH, mode=Mode.SUBTRACT)

    # Sketch20 → Cut-Extrude12 (cut)
    with BuildSketch(Plane(origin=(0, 0, 0), x_dir=(-1, 0, 0), z_dir=(0, -1, 0))):
        with Locations(Location((19.5, 69.019658785, 0), (0, 0, 90))):
            Circle(SKETCH20_R)
        with Locations(Location((-19.5, 69.019658785, 0), (0, 0, 90))):
            Circle(SKETCH20_R)
    extrude(amount=-CUT_EXTRUDE12_DEPTH, mode=Mode.SUBTRACT)


solid = part.part
